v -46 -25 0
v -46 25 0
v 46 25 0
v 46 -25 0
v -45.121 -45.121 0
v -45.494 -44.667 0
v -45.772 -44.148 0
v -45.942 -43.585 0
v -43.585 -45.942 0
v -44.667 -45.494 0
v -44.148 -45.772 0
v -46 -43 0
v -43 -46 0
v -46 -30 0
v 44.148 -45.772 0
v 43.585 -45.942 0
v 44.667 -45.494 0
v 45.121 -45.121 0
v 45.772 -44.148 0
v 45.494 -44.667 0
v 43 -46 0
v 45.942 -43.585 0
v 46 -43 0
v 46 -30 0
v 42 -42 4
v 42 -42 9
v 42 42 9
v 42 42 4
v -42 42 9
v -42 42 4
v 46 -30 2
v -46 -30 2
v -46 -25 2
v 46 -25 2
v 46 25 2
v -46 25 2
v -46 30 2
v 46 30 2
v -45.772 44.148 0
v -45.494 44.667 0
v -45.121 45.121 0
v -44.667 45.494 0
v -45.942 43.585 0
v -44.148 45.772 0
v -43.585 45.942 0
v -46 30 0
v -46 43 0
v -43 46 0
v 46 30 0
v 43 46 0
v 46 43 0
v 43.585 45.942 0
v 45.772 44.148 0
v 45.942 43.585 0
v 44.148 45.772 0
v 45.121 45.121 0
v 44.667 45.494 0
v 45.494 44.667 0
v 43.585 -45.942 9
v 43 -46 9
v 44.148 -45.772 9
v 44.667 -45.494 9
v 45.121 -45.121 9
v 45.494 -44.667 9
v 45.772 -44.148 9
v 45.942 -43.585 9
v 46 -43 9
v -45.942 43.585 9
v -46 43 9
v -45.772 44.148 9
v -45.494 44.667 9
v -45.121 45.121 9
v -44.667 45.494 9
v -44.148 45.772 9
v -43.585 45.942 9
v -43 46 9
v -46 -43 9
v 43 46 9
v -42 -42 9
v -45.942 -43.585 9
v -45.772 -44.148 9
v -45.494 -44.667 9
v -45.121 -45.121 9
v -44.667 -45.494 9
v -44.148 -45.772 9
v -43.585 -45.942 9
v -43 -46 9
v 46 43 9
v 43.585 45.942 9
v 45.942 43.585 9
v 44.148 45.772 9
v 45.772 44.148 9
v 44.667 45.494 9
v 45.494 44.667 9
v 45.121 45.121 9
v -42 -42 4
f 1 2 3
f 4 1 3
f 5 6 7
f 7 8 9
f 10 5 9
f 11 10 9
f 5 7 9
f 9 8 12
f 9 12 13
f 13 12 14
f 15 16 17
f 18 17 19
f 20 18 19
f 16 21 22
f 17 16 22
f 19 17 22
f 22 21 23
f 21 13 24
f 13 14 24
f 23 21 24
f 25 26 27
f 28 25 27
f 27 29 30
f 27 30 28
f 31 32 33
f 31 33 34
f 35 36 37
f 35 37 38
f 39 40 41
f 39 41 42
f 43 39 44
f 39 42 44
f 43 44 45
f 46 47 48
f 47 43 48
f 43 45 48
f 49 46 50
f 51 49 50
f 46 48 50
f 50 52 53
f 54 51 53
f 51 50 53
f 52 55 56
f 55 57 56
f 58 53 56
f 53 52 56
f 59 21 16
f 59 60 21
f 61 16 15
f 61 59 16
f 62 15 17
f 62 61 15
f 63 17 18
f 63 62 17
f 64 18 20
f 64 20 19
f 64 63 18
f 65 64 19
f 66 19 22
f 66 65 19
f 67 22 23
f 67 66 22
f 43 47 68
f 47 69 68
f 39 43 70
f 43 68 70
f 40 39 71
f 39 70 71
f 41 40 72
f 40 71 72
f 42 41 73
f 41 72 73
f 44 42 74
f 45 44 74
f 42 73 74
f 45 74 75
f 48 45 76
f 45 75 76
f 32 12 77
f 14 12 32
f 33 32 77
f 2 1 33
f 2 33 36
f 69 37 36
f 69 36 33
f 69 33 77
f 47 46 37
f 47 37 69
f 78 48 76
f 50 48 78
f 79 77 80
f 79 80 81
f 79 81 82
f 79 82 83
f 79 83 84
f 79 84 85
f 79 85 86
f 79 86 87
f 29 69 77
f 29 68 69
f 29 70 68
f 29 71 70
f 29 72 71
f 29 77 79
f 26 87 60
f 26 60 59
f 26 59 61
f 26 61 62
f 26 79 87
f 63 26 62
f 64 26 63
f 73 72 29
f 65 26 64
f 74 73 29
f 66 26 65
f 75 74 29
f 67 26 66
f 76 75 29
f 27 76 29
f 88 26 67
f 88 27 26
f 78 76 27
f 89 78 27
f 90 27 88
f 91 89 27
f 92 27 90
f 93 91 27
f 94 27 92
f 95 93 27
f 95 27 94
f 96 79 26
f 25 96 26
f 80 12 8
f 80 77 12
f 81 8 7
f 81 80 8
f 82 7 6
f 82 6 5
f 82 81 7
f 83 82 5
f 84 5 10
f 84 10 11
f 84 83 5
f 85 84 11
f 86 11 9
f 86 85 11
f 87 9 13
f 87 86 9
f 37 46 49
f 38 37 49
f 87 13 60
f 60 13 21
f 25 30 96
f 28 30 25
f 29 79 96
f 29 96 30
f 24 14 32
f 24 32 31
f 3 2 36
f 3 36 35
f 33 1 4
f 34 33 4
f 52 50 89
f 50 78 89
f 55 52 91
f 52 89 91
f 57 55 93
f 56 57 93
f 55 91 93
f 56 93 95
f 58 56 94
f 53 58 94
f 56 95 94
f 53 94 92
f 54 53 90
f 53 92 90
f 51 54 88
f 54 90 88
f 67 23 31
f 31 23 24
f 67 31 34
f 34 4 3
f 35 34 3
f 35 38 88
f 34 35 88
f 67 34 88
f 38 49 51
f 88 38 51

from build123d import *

# Parameters (mm, degrees)
SKETCH_W        = 92
SKETCH_H        = 92
PAD_DEPTH       = 9
SKETCH001_W     = 84
SKETCH001_H     = 84
POCKET_DEPTH    = 5
FILLET_R        = 3
SKETCH002_W     = 92
SKETCH002_H     = 5
POCKET001_DEPTH = 2


with BuildPart() as part:
    # Sketch → Pad (new body)
    with BuildSketch(Plane.XY):
        Rectangle(SKETCH_W, SKETCH_H)
    extrude(amount=PAD_DEPTH)

    # Sketch001 (on Face6 of Pad) → Pocket (cut)
    with BuildSketch(Plane.XY.offset(9)):
        Rectangle(SKETCH001_W, SKETCH001_H)
    extrude(amount=-POCKET_DEPTH, mode=Mode.SUBTRACT)

    # Fillet
    fillet_edges = [part.edges().sort_by_distance(p)[0] for p in [
        (-46, 46, 4.5),
        (-46, -46, 4.5),
        (46, -46, 4.5),
        (46, 46, 4.5),
    ]]
    fillet(fillet_edges, radius=FILLET_R)

    # Sketch002 (on Face2 of Fillet) → Pocket001 (cut)
    with BuildSketch(Plane(origin=(0, 0, 0), x_dir=(1, 0, 0), z_dir=(0, 0, -1))):
        with Locations((0, 27.5)):
            Rectangle(SKETCH002_W, SKETCH002_H)
        with Locations((0, -27.5)):
            Rectangle(SKETCH002_W, SKETCH002_H)
    extrude(amount=-POCKET001_DEPTH, mode=Mode.SUBTRACT)


solid = part.part
